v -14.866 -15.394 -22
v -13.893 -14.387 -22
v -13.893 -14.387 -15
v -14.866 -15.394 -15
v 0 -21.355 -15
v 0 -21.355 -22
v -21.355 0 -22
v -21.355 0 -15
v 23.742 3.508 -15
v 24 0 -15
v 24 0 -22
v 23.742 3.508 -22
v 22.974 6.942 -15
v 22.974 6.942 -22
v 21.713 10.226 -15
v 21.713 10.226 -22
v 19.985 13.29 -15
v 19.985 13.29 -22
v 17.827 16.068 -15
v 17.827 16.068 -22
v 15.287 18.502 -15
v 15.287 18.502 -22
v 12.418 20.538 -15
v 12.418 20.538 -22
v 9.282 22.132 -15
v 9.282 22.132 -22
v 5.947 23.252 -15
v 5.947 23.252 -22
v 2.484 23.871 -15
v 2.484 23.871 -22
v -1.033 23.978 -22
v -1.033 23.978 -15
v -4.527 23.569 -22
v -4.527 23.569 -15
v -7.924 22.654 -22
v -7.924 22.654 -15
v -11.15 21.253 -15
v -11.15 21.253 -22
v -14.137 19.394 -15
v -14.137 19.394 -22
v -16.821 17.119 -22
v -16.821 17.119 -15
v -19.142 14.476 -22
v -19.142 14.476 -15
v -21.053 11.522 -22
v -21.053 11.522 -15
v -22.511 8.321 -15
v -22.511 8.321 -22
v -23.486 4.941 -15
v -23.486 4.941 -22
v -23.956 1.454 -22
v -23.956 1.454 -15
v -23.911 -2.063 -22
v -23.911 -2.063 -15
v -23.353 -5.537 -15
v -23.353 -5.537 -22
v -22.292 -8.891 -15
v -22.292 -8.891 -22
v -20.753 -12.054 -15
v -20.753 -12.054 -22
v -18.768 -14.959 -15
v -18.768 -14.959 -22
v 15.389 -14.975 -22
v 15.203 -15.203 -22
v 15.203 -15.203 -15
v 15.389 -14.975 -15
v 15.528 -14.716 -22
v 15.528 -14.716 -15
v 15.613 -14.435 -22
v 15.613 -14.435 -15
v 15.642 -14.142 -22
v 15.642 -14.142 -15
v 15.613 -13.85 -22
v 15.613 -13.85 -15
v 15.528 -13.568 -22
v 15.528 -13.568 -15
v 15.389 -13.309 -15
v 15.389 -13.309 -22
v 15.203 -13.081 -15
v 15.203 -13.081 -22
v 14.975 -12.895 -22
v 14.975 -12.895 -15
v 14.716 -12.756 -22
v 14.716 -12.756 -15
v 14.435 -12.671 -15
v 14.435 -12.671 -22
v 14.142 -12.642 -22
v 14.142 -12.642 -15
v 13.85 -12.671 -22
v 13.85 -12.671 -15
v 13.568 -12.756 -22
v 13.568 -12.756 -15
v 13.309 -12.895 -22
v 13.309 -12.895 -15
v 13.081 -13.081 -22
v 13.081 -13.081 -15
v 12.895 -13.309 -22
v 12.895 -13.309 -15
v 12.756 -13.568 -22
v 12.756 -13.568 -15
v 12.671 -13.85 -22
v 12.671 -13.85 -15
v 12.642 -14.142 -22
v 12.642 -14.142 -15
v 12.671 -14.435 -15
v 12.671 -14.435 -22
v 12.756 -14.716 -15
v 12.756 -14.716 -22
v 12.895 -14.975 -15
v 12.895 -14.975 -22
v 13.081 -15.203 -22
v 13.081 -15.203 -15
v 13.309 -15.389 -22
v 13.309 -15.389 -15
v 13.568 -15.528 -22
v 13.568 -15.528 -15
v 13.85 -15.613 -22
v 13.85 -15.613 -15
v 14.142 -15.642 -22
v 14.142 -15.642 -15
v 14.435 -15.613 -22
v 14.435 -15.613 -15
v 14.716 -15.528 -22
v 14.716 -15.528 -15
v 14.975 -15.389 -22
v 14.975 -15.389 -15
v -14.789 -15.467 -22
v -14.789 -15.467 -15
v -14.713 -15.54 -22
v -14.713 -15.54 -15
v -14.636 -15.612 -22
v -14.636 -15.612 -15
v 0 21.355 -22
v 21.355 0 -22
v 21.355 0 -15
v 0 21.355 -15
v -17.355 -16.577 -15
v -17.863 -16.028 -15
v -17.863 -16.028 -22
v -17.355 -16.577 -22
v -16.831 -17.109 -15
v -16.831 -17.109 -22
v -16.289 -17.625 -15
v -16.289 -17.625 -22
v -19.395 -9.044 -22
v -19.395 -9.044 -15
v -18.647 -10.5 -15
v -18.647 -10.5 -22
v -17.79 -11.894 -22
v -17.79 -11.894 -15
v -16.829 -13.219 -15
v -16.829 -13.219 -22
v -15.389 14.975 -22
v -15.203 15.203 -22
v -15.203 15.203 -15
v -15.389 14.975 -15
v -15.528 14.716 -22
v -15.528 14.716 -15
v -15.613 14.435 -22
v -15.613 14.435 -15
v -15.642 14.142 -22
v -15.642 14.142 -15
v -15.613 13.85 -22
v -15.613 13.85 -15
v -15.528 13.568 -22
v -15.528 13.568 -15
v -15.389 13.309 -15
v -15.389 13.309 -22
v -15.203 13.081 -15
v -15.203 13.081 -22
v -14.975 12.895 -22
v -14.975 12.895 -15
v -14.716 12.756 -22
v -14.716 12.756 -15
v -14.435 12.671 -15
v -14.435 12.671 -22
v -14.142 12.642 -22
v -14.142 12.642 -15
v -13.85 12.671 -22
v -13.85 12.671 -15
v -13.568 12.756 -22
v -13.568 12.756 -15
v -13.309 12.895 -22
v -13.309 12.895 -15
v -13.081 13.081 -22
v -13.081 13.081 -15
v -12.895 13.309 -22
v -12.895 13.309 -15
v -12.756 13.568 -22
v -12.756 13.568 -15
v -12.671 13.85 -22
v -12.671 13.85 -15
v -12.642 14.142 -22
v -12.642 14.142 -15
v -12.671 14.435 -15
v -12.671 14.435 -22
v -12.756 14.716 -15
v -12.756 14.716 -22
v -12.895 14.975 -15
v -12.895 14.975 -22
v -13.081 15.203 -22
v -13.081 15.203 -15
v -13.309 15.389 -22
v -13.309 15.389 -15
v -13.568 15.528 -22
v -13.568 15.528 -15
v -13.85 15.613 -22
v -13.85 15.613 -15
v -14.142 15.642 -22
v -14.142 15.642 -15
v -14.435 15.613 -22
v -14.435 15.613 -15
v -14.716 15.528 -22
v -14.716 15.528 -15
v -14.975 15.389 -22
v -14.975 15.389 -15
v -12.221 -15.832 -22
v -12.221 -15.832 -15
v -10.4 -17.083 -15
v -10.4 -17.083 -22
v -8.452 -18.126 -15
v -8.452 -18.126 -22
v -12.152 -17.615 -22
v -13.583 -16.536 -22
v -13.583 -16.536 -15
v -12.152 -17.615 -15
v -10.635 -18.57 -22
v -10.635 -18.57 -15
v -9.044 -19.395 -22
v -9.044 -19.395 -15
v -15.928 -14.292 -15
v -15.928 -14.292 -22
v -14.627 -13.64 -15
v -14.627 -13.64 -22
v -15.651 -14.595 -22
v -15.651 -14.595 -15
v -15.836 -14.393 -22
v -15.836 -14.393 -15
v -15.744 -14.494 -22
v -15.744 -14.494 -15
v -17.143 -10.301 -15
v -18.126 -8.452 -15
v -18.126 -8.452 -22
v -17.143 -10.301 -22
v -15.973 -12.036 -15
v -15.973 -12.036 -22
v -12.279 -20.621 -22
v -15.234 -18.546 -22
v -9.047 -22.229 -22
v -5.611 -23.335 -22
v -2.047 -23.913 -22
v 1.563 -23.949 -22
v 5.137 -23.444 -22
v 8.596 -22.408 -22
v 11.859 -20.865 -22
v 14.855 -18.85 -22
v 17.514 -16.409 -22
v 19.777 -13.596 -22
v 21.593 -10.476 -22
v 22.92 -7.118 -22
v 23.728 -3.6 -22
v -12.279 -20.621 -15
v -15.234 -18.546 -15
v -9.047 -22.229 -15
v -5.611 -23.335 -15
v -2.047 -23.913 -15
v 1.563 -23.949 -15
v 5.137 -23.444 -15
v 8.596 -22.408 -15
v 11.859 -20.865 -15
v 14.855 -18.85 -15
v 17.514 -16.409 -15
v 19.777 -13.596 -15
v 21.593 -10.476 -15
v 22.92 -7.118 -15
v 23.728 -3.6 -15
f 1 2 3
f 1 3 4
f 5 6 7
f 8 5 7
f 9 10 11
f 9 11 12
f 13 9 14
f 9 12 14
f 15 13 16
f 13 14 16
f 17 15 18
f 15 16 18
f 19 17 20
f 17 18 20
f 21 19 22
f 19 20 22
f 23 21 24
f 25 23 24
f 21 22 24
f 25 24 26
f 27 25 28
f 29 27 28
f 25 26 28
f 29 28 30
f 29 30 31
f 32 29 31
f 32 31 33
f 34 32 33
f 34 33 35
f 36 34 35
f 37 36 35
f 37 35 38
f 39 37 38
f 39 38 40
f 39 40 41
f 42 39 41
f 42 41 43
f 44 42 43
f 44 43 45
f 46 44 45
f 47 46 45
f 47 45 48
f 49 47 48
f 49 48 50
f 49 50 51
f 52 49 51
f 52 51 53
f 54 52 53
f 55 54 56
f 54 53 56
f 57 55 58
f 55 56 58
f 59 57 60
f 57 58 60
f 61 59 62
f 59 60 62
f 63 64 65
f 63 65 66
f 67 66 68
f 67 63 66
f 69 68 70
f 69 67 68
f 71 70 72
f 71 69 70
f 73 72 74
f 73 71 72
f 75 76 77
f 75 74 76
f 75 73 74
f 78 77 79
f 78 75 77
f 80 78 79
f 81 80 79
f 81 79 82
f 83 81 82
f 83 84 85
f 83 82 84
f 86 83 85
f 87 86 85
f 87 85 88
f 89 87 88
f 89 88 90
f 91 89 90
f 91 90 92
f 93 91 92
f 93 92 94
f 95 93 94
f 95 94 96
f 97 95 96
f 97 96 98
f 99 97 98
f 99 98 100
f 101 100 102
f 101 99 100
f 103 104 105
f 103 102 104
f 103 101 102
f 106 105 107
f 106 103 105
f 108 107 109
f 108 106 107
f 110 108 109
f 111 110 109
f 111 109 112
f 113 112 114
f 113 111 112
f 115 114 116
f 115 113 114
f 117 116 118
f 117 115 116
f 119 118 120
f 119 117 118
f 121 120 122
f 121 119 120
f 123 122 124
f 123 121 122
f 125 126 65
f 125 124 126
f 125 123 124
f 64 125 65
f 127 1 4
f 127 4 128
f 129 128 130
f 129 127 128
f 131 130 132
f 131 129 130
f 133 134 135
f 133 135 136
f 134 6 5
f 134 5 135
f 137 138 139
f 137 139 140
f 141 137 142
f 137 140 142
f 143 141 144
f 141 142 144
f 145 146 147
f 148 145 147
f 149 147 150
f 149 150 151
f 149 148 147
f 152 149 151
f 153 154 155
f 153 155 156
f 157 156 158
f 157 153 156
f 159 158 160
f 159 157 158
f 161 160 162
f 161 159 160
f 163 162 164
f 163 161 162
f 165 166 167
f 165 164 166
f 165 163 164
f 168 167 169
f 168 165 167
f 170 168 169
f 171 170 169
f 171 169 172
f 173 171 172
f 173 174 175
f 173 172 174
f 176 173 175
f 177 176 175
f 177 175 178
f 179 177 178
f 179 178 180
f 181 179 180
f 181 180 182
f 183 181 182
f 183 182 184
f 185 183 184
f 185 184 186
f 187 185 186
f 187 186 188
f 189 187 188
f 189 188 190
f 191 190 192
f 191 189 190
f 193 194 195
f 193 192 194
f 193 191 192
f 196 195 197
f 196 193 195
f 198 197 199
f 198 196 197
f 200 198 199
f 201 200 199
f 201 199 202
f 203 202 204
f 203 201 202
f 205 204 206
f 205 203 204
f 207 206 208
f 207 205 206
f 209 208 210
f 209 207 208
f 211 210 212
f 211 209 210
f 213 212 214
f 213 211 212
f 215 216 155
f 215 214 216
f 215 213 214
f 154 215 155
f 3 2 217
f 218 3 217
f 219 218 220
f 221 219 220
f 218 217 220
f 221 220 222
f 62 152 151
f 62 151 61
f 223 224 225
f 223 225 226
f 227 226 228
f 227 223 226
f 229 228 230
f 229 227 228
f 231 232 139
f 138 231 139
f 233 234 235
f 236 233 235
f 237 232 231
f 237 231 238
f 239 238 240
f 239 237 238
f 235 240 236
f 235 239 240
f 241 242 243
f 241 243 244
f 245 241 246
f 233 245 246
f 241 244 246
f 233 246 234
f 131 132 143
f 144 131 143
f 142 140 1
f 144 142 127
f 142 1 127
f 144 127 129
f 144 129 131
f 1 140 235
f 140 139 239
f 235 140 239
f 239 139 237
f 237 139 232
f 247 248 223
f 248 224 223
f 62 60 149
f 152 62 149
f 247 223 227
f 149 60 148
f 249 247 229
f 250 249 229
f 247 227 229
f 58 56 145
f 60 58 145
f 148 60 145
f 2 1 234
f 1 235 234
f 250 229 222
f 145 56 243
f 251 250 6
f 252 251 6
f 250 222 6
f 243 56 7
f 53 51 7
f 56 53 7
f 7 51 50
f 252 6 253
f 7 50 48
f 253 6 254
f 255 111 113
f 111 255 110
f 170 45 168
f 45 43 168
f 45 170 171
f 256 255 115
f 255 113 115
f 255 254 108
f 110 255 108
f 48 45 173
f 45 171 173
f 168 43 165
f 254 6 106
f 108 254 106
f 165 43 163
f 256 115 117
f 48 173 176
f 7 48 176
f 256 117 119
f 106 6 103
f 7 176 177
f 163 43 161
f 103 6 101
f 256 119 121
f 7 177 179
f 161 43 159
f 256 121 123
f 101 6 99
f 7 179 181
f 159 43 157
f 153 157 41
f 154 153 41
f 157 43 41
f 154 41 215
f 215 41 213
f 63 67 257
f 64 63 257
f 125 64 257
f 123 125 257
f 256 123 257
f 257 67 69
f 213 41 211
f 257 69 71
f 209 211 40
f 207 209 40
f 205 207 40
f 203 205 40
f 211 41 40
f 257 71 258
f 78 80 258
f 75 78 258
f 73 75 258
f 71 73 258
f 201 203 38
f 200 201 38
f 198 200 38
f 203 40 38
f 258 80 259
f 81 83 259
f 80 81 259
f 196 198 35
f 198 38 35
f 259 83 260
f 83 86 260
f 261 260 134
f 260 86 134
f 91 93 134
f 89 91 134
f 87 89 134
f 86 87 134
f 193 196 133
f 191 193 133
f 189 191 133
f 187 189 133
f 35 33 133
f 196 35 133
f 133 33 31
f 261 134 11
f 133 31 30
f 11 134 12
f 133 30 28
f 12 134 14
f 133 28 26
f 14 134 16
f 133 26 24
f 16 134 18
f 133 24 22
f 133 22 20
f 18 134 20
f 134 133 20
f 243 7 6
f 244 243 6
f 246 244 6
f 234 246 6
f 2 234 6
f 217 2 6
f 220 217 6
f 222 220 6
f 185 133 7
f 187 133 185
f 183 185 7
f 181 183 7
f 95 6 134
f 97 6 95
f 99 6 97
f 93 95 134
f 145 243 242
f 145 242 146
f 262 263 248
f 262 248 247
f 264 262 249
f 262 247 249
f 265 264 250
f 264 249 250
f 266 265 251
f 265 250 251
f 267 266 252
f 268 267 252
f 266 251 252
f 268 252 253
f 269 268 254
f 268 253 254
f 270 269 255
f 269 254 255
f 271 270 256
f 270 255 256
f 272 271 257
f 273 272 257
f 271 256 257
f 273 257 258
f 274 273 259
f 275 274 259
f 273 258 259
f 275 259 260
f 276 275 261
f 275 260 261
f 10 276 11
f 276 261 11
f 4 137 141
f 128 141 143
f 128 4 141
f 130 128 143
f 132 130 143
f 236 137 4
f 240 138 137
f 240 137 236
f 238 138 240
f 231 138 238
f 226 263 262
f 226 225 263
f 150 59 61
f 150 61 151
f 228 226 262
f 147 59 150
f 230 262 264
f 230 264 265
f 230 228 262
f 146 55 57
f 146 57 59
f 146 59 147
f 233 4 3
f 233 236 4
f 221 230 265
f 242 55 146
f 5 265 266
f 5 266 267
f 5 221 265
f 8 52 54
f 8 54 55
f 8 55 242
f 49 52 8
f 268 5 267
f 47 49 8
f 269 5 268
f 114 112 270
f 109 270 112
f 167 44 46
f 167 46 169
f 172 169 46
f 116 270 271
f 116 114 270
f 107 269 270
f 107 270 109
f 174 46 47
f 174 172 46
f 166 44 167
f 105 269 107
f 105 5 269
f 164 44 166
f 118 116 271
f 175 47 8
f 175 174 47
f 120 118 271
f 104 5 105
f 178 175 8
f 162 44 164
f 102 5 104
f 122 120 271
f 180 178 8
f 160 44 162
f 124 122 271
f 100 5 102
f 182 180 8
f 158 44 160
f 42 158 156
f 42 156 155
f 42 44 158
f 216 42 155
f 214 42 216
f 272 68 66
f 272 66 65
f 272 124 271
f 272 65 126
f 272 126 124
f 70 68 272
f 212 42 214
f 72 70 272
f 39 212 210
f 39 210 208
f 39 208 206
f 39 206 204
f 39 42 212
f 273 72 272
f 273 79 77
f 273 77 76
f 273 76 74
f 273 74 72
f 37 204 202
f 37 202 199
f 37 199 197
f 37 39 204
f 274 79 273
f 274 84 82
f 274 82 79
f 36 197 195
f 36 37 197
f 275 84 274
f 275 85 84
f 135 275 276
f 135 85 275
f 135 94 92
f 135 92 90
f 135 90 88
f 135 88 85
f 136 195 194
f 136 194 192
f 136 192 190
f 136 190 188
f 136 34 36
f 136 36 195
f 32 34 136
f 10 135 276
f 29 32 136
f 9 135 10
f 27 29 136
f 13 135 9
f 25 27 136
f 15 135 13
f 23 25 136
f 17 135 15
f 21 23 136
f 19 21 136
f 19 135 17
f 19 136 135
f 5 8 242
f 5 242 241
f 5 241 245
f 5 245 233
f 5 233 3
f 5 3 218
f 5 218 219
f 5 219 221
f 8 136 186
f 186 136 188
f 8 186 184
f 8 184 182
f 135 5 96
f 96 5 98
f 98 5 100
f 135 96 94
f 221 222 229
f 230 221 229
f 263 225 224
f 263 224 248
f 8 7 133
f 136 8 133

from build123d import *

# Parameters (mm, degrees)
CYLINDER804_R               = 20
CYLINDER804_DEPTH           = 7
BOX313_W                    = 1.4
BOX313_H                    = 60
BOX313_DEPTH                = 7
BOX313_PLACEMENT_ANGLE      = 5.7
BOX314_W                    = 1.4
BOX314_H                    = 60
BOX314_DEPTH                = 7
BOX314_PLACEMENT_ANGLE      = 3
CUT339_PLACEMENT_ANGLE      = 134.9
BOX311_W                    = 60
BOX311_H                    = 60
BOX311_DEPTH                = 7
BOX311_PLACEMENT_ANGLE      = 1
BOX312_W                    = 60
BOX312_H                    = 60
BOX312_DEPTH                = 7
BOX312_PLACEMENT_ANGLE      = 2
BOX310_W                    = 120
BOX310_H                    = 60
BOX310_DEPTH                = 7
TUBE084_R                   = 21.4
TUBE084_R_2                 = 20
TUBE084_DEPTH               = 7
BOX308_W                    = 60
BOX308_H                    = 60
BOX308_DEPTH                = 7
BOX308_PLACEMENT_ANGLE      = 20
BOX307_W                    = 60
BOX307_H                    = 60
BOX307_DEPTH                = 7
BOX307_PLACEMENT_ANGLE      = 20
BOX309_W                    = 120
BOX309_H                    = 60
BOX309_DEPTH                = 7
TUBE085_R                   = 21.4
TUBE085_R_2                 = 20
TUBE085_DEPTH               = 7
CUT335_PLACEMENT_ANGLE      = 135
CYLINDER811_R               = 1.5
CYLINDER811_DEPTH           = 20
CYLINDER811_PLACEMENT_ANGLE = 135
CYLINDER810_R               = 1.5
CYLINDER810_DEPTH           = 20
CYLINDER810_PLACEMENT_ANGLE = 45
BOX_W                       = 30.2
BOX_H                       = 30.2
BOX_DEPTH                   = 100
BOX_PLACEMENT_ANGLE         = 45
CYLINDER_R                  = 24
CYLINDER_DEPTH              = 7


with BuildPart() as v_lec804:
    # Cylinder804 → Cylinder804 (new body)
    with BuildSketch(Plane.XY.offset(-22)):
        Circle(CYLINDER804_R)
    extrude(amount=CYLINDER804_DEPTH)


with BuildPart() as krychle313:
    # Box313 → Box313 (new body)
    with BuildSketch(Plane.XY):
        with Locations((0.7, 30)):
            Rectangle(BOX313_W, BOX313_H)
    extrude(amount=BOX313_DEPTH)


with BuildPart() as krychle313_1:
    # Box313 placement: moved
    add(krychle313.part.moved(Location((0, 0, -22))).rotate(Axis((0, 0, -22), (0, 0, 1)), BOX313_PLACEMENT_ANGLE))


with BuildPart() as cut339:
    # Box314 → Box314 (new body)
    with BuildSketch(Plane.XY):
        with Locations((0.7, 30)):
            Rectangle(BOX314_W, BOX314_H)
    extrude(amount=BOX314_DEPTH)


with BuildPart() as cut339_1:
    # Box314 placement: moved
    add(cut339.part.moved(Location((0, 0, -22))).rotate(Axis((0, 0, -22), (0, 0, -1)), BOX314_PLACEMENT_ANGLE))

    # Compound720: union Krychle313
    add(krychle313_1.part)

    # Cut339: cut Válec804
    add(v_lec804.part, mode=Mode.SUBTRACT)


with BuildPart() as cut339_2:
    # Cut339 placement: moved
    add(cut339_1.part.rotate(Axis((0, 0, 0), (0, 0, 1)), CUT339_PLACEMENT_ANGLE))


with BuildPart() as krychle311:
    # Box311 → Box311 (new body)
    with BuildSketch(Plane.XY):
        with Locations((30, 30)):
            Rectangle(BOX311_W, BOX311_H)
    extrude(amount=BOX311_DEPTH)


with BuildPart() as krychle311_1:
    # Box311 placement: moved
    add(krychle311.part.moved(Location((-59.990862, -1.047144, -22))).rotate(Axis((-59.990862, -1.047144, -22), (0, 0, 1)), BOX311_PLACEMENT_ANGLE))


with BuildPart() as compound719:
    # Box312 → Box312 (new body)
    with BuildSketch(Plane.XY):
        with Locations((30, 30)):
            Rectangle(BOX312_W, BOX312_H)
    extrude(amount=BOX312_DEPTH)


with BuildPart() as compound719_1:
    # Box312 placement: moved
    add(compound719.part.moved(Location((0, 0, -22))).rotate(Axis((0, 0, -22), (0, 0, -1)), BOX312_PLACEMENT_ANGLE))

    # Compound719: union Krychle311
    add(krychle311_1.part)


with BuildPart() as krychle310:
    # Box310 → Box310 (new body)
    with BuildSketch(Plane(origin=(-60, -60, -22), x_dir=(1, 0, 0), z_dir=(0, 0, 1))):
        with Locations((60, 30)):
            Rectangle(BOX310_W, BOX310_H)
    extrude(amount=BOX310_DEPTH)


with BuildPart() as cut338:
    # Tube084 → Tube084 (new body)
    with BuildSketch(Plane.XY.offset(-22)):
        Circle(TUBE084_R)
        Circle(TUBE084_R_2, mode=Mode.SUBTRACT)
    extrude(amount=TUBE084_DEPTH)

    # Cut337: cut Krychle310
    add(krychle310.part, mode=Mode.SUBTRACT)

    # Cut338: cut Compound719
    add(compound719_1.part, mode=Mode.SUBTRACT)


with BuildPart() as cut338_1:
    # Cut338 placement: moved
    add(cut338.part.moved(Location((0, 0, -7))))


with BuildPart() as krychle308:
    # Box308 → Box308 (new body)
    with BuildSketch(Plane.XY):
        with Locations((30, 30)):
            Rectangle(BOX308_W, BOX308_H)
    extrude(amount=BOX308_DEPTH)


with BuildPart() as krychle308_1:
    # Box308 placement: moved
    add(krychle308.part.moved(Location((-56.381557, -20.521209, -22))).rotate(Axis((-56.381557, -20.521209, -22), (0, 0, 1)), BOX308_PLACEMENT_ANGLE))


with BuildPart() as compound718:
    # Box307 → Box307 (new body)
    with BuildSketch(Plane.XY):
        with Locations((30, 30)):
            Rectangle(BOX307_W, BOX307_H)
    extrude(amount=BOX307_DEPTH)


with BuildPart() as compound718_1:
    # Box307 placement: moved
    add(compound718.part.moved(Location((0, 0, -22))).rotate(Axis((0, 0, -22), (0, 0, -1)), BOX307_PLACEMENT_ANGLE))

    # Compound718: union Krychle308
    add(krychle308_1.part)


with BuildPart() as krychle309:
    # Box309 → Box309 (new body)
    with BuildSketch(Plane(origin=(-60, -60, -22), x_dir=(1, 0, 0), z_dir=(0, 0, 1))):
        with Locations((60, 30)):
            Rectangle(BOX309_W, BOX309_H)
    extrude(amount=BOX309_DEPTH)


with BuildPart() as cut335:
    # Tube085 → Tube085 (new body)
    with BuildSketch(Plane.XY.offset(-22)):
        Circle(TUBE085_R)
        Circle(TUBE085_R_2, mode=Mode.SUBTRACT)
    extrude(amount=TUBE085_DEPTH)

    # Cut334: cut Krychle309
    add(krychle309.part, mode=Mode.SUBTRACT)

    # Cut336: cut Compound718
    add(compound718_1.part, mode=Mode.SUBTRACT)


with BuildPart() as cut335_1:
    # Cut336 placement: moved
    add(cut335.part.moved(Location((0, 0, -7))))

    # Cut335: cut Cut338
    add(cut338_1.part, mode=Mode.SUBTRACT)


with BuildPart() as cut335_2:
    # Cut335 placement: moved
    add(cut335_1.part.moved(Location((0, 0, 7))).rotate(Axis((0, 0, 7), (0, 0, 1)), CUT335_PLACEMENT_ANGLE))


with BuildPart() as v_lec811:
    # Cylinder811 → Cylinder811 (new body)
    with BuildSketch(Plane.XY):
        Circle(CYLINDER811_R)
    extrude(amount=CYLINDER811_DEPTH)


with BuildPart() as v_lec811_1:
    # Cylinder811 placement: moved
    add(v_lec811.part.moved(Location((-14.142136, 14.142136, -30))).rotate(Axis((-14.142136, 14.142136, -30), (0, 0, 1)), CYLINDER811_PLACEMENT_ANGLE))


with BuildPart() as compound721:
    # Cylinder810 → Cylinder810 (new body)
    with BuildSketch(Plane.XY):
        Circle(CYLINDER810_R)
    extrude(amount=CYLINDER810_DEPTH)


with BuildPart() as compound721_1:
    # Cylinder810 placement: moved
    add(compound721.part.moved(Location((14.142136, -14.142136, -30))).rotate(Axis((14.142136, -14.142136, -30), (0, 0, -1)), CYLINDER810_PLACEMENT_ANGLE))

    # Compound721: union Válec811
    add(v_lec811_1.part)


with BuildPart() as krychle:
    # Box → Box (new body)
    with BuildSketch(Plane.XY):
        with Locations((15.1, 15.1)):
            Rectangle(BOX_W, BOX_H)
    extrude(amount=BOX_DEPTH)


with BuildPart() as krychle_1:
    # Box placement: moved
    add(krychle.part.moved(Location((0, -21.354625, -30))).rotate(Axis((0, -21.354625, -30), (0, 0, 1)), BOX_PLACEMENT_ANGLE))


with BuildPart() as cut348:
    # Cylinder → Cylinder (new body)
    with BuildSketch(Plane.XY.offset(-22)):
        Circle(CYLINDER_R)
    extrude(amount=CYLINDER_DEPTH)

    # Cut: cut Krychle
    add(krychle_1.part, mode=Mode.SUBTRACT)

    # Cut343: cut Compound721
    add(compound721_1.part, mode=Mode.SUBTRACT)

    # Cut347: cut Cut335
    add(cut335_2.part, mode=Mode.SUBTRACT)

    # Cut348: cut Cut339
    add(cut339_2.part, mode=Mode.SUBTRACT)


solid = cut348.part
